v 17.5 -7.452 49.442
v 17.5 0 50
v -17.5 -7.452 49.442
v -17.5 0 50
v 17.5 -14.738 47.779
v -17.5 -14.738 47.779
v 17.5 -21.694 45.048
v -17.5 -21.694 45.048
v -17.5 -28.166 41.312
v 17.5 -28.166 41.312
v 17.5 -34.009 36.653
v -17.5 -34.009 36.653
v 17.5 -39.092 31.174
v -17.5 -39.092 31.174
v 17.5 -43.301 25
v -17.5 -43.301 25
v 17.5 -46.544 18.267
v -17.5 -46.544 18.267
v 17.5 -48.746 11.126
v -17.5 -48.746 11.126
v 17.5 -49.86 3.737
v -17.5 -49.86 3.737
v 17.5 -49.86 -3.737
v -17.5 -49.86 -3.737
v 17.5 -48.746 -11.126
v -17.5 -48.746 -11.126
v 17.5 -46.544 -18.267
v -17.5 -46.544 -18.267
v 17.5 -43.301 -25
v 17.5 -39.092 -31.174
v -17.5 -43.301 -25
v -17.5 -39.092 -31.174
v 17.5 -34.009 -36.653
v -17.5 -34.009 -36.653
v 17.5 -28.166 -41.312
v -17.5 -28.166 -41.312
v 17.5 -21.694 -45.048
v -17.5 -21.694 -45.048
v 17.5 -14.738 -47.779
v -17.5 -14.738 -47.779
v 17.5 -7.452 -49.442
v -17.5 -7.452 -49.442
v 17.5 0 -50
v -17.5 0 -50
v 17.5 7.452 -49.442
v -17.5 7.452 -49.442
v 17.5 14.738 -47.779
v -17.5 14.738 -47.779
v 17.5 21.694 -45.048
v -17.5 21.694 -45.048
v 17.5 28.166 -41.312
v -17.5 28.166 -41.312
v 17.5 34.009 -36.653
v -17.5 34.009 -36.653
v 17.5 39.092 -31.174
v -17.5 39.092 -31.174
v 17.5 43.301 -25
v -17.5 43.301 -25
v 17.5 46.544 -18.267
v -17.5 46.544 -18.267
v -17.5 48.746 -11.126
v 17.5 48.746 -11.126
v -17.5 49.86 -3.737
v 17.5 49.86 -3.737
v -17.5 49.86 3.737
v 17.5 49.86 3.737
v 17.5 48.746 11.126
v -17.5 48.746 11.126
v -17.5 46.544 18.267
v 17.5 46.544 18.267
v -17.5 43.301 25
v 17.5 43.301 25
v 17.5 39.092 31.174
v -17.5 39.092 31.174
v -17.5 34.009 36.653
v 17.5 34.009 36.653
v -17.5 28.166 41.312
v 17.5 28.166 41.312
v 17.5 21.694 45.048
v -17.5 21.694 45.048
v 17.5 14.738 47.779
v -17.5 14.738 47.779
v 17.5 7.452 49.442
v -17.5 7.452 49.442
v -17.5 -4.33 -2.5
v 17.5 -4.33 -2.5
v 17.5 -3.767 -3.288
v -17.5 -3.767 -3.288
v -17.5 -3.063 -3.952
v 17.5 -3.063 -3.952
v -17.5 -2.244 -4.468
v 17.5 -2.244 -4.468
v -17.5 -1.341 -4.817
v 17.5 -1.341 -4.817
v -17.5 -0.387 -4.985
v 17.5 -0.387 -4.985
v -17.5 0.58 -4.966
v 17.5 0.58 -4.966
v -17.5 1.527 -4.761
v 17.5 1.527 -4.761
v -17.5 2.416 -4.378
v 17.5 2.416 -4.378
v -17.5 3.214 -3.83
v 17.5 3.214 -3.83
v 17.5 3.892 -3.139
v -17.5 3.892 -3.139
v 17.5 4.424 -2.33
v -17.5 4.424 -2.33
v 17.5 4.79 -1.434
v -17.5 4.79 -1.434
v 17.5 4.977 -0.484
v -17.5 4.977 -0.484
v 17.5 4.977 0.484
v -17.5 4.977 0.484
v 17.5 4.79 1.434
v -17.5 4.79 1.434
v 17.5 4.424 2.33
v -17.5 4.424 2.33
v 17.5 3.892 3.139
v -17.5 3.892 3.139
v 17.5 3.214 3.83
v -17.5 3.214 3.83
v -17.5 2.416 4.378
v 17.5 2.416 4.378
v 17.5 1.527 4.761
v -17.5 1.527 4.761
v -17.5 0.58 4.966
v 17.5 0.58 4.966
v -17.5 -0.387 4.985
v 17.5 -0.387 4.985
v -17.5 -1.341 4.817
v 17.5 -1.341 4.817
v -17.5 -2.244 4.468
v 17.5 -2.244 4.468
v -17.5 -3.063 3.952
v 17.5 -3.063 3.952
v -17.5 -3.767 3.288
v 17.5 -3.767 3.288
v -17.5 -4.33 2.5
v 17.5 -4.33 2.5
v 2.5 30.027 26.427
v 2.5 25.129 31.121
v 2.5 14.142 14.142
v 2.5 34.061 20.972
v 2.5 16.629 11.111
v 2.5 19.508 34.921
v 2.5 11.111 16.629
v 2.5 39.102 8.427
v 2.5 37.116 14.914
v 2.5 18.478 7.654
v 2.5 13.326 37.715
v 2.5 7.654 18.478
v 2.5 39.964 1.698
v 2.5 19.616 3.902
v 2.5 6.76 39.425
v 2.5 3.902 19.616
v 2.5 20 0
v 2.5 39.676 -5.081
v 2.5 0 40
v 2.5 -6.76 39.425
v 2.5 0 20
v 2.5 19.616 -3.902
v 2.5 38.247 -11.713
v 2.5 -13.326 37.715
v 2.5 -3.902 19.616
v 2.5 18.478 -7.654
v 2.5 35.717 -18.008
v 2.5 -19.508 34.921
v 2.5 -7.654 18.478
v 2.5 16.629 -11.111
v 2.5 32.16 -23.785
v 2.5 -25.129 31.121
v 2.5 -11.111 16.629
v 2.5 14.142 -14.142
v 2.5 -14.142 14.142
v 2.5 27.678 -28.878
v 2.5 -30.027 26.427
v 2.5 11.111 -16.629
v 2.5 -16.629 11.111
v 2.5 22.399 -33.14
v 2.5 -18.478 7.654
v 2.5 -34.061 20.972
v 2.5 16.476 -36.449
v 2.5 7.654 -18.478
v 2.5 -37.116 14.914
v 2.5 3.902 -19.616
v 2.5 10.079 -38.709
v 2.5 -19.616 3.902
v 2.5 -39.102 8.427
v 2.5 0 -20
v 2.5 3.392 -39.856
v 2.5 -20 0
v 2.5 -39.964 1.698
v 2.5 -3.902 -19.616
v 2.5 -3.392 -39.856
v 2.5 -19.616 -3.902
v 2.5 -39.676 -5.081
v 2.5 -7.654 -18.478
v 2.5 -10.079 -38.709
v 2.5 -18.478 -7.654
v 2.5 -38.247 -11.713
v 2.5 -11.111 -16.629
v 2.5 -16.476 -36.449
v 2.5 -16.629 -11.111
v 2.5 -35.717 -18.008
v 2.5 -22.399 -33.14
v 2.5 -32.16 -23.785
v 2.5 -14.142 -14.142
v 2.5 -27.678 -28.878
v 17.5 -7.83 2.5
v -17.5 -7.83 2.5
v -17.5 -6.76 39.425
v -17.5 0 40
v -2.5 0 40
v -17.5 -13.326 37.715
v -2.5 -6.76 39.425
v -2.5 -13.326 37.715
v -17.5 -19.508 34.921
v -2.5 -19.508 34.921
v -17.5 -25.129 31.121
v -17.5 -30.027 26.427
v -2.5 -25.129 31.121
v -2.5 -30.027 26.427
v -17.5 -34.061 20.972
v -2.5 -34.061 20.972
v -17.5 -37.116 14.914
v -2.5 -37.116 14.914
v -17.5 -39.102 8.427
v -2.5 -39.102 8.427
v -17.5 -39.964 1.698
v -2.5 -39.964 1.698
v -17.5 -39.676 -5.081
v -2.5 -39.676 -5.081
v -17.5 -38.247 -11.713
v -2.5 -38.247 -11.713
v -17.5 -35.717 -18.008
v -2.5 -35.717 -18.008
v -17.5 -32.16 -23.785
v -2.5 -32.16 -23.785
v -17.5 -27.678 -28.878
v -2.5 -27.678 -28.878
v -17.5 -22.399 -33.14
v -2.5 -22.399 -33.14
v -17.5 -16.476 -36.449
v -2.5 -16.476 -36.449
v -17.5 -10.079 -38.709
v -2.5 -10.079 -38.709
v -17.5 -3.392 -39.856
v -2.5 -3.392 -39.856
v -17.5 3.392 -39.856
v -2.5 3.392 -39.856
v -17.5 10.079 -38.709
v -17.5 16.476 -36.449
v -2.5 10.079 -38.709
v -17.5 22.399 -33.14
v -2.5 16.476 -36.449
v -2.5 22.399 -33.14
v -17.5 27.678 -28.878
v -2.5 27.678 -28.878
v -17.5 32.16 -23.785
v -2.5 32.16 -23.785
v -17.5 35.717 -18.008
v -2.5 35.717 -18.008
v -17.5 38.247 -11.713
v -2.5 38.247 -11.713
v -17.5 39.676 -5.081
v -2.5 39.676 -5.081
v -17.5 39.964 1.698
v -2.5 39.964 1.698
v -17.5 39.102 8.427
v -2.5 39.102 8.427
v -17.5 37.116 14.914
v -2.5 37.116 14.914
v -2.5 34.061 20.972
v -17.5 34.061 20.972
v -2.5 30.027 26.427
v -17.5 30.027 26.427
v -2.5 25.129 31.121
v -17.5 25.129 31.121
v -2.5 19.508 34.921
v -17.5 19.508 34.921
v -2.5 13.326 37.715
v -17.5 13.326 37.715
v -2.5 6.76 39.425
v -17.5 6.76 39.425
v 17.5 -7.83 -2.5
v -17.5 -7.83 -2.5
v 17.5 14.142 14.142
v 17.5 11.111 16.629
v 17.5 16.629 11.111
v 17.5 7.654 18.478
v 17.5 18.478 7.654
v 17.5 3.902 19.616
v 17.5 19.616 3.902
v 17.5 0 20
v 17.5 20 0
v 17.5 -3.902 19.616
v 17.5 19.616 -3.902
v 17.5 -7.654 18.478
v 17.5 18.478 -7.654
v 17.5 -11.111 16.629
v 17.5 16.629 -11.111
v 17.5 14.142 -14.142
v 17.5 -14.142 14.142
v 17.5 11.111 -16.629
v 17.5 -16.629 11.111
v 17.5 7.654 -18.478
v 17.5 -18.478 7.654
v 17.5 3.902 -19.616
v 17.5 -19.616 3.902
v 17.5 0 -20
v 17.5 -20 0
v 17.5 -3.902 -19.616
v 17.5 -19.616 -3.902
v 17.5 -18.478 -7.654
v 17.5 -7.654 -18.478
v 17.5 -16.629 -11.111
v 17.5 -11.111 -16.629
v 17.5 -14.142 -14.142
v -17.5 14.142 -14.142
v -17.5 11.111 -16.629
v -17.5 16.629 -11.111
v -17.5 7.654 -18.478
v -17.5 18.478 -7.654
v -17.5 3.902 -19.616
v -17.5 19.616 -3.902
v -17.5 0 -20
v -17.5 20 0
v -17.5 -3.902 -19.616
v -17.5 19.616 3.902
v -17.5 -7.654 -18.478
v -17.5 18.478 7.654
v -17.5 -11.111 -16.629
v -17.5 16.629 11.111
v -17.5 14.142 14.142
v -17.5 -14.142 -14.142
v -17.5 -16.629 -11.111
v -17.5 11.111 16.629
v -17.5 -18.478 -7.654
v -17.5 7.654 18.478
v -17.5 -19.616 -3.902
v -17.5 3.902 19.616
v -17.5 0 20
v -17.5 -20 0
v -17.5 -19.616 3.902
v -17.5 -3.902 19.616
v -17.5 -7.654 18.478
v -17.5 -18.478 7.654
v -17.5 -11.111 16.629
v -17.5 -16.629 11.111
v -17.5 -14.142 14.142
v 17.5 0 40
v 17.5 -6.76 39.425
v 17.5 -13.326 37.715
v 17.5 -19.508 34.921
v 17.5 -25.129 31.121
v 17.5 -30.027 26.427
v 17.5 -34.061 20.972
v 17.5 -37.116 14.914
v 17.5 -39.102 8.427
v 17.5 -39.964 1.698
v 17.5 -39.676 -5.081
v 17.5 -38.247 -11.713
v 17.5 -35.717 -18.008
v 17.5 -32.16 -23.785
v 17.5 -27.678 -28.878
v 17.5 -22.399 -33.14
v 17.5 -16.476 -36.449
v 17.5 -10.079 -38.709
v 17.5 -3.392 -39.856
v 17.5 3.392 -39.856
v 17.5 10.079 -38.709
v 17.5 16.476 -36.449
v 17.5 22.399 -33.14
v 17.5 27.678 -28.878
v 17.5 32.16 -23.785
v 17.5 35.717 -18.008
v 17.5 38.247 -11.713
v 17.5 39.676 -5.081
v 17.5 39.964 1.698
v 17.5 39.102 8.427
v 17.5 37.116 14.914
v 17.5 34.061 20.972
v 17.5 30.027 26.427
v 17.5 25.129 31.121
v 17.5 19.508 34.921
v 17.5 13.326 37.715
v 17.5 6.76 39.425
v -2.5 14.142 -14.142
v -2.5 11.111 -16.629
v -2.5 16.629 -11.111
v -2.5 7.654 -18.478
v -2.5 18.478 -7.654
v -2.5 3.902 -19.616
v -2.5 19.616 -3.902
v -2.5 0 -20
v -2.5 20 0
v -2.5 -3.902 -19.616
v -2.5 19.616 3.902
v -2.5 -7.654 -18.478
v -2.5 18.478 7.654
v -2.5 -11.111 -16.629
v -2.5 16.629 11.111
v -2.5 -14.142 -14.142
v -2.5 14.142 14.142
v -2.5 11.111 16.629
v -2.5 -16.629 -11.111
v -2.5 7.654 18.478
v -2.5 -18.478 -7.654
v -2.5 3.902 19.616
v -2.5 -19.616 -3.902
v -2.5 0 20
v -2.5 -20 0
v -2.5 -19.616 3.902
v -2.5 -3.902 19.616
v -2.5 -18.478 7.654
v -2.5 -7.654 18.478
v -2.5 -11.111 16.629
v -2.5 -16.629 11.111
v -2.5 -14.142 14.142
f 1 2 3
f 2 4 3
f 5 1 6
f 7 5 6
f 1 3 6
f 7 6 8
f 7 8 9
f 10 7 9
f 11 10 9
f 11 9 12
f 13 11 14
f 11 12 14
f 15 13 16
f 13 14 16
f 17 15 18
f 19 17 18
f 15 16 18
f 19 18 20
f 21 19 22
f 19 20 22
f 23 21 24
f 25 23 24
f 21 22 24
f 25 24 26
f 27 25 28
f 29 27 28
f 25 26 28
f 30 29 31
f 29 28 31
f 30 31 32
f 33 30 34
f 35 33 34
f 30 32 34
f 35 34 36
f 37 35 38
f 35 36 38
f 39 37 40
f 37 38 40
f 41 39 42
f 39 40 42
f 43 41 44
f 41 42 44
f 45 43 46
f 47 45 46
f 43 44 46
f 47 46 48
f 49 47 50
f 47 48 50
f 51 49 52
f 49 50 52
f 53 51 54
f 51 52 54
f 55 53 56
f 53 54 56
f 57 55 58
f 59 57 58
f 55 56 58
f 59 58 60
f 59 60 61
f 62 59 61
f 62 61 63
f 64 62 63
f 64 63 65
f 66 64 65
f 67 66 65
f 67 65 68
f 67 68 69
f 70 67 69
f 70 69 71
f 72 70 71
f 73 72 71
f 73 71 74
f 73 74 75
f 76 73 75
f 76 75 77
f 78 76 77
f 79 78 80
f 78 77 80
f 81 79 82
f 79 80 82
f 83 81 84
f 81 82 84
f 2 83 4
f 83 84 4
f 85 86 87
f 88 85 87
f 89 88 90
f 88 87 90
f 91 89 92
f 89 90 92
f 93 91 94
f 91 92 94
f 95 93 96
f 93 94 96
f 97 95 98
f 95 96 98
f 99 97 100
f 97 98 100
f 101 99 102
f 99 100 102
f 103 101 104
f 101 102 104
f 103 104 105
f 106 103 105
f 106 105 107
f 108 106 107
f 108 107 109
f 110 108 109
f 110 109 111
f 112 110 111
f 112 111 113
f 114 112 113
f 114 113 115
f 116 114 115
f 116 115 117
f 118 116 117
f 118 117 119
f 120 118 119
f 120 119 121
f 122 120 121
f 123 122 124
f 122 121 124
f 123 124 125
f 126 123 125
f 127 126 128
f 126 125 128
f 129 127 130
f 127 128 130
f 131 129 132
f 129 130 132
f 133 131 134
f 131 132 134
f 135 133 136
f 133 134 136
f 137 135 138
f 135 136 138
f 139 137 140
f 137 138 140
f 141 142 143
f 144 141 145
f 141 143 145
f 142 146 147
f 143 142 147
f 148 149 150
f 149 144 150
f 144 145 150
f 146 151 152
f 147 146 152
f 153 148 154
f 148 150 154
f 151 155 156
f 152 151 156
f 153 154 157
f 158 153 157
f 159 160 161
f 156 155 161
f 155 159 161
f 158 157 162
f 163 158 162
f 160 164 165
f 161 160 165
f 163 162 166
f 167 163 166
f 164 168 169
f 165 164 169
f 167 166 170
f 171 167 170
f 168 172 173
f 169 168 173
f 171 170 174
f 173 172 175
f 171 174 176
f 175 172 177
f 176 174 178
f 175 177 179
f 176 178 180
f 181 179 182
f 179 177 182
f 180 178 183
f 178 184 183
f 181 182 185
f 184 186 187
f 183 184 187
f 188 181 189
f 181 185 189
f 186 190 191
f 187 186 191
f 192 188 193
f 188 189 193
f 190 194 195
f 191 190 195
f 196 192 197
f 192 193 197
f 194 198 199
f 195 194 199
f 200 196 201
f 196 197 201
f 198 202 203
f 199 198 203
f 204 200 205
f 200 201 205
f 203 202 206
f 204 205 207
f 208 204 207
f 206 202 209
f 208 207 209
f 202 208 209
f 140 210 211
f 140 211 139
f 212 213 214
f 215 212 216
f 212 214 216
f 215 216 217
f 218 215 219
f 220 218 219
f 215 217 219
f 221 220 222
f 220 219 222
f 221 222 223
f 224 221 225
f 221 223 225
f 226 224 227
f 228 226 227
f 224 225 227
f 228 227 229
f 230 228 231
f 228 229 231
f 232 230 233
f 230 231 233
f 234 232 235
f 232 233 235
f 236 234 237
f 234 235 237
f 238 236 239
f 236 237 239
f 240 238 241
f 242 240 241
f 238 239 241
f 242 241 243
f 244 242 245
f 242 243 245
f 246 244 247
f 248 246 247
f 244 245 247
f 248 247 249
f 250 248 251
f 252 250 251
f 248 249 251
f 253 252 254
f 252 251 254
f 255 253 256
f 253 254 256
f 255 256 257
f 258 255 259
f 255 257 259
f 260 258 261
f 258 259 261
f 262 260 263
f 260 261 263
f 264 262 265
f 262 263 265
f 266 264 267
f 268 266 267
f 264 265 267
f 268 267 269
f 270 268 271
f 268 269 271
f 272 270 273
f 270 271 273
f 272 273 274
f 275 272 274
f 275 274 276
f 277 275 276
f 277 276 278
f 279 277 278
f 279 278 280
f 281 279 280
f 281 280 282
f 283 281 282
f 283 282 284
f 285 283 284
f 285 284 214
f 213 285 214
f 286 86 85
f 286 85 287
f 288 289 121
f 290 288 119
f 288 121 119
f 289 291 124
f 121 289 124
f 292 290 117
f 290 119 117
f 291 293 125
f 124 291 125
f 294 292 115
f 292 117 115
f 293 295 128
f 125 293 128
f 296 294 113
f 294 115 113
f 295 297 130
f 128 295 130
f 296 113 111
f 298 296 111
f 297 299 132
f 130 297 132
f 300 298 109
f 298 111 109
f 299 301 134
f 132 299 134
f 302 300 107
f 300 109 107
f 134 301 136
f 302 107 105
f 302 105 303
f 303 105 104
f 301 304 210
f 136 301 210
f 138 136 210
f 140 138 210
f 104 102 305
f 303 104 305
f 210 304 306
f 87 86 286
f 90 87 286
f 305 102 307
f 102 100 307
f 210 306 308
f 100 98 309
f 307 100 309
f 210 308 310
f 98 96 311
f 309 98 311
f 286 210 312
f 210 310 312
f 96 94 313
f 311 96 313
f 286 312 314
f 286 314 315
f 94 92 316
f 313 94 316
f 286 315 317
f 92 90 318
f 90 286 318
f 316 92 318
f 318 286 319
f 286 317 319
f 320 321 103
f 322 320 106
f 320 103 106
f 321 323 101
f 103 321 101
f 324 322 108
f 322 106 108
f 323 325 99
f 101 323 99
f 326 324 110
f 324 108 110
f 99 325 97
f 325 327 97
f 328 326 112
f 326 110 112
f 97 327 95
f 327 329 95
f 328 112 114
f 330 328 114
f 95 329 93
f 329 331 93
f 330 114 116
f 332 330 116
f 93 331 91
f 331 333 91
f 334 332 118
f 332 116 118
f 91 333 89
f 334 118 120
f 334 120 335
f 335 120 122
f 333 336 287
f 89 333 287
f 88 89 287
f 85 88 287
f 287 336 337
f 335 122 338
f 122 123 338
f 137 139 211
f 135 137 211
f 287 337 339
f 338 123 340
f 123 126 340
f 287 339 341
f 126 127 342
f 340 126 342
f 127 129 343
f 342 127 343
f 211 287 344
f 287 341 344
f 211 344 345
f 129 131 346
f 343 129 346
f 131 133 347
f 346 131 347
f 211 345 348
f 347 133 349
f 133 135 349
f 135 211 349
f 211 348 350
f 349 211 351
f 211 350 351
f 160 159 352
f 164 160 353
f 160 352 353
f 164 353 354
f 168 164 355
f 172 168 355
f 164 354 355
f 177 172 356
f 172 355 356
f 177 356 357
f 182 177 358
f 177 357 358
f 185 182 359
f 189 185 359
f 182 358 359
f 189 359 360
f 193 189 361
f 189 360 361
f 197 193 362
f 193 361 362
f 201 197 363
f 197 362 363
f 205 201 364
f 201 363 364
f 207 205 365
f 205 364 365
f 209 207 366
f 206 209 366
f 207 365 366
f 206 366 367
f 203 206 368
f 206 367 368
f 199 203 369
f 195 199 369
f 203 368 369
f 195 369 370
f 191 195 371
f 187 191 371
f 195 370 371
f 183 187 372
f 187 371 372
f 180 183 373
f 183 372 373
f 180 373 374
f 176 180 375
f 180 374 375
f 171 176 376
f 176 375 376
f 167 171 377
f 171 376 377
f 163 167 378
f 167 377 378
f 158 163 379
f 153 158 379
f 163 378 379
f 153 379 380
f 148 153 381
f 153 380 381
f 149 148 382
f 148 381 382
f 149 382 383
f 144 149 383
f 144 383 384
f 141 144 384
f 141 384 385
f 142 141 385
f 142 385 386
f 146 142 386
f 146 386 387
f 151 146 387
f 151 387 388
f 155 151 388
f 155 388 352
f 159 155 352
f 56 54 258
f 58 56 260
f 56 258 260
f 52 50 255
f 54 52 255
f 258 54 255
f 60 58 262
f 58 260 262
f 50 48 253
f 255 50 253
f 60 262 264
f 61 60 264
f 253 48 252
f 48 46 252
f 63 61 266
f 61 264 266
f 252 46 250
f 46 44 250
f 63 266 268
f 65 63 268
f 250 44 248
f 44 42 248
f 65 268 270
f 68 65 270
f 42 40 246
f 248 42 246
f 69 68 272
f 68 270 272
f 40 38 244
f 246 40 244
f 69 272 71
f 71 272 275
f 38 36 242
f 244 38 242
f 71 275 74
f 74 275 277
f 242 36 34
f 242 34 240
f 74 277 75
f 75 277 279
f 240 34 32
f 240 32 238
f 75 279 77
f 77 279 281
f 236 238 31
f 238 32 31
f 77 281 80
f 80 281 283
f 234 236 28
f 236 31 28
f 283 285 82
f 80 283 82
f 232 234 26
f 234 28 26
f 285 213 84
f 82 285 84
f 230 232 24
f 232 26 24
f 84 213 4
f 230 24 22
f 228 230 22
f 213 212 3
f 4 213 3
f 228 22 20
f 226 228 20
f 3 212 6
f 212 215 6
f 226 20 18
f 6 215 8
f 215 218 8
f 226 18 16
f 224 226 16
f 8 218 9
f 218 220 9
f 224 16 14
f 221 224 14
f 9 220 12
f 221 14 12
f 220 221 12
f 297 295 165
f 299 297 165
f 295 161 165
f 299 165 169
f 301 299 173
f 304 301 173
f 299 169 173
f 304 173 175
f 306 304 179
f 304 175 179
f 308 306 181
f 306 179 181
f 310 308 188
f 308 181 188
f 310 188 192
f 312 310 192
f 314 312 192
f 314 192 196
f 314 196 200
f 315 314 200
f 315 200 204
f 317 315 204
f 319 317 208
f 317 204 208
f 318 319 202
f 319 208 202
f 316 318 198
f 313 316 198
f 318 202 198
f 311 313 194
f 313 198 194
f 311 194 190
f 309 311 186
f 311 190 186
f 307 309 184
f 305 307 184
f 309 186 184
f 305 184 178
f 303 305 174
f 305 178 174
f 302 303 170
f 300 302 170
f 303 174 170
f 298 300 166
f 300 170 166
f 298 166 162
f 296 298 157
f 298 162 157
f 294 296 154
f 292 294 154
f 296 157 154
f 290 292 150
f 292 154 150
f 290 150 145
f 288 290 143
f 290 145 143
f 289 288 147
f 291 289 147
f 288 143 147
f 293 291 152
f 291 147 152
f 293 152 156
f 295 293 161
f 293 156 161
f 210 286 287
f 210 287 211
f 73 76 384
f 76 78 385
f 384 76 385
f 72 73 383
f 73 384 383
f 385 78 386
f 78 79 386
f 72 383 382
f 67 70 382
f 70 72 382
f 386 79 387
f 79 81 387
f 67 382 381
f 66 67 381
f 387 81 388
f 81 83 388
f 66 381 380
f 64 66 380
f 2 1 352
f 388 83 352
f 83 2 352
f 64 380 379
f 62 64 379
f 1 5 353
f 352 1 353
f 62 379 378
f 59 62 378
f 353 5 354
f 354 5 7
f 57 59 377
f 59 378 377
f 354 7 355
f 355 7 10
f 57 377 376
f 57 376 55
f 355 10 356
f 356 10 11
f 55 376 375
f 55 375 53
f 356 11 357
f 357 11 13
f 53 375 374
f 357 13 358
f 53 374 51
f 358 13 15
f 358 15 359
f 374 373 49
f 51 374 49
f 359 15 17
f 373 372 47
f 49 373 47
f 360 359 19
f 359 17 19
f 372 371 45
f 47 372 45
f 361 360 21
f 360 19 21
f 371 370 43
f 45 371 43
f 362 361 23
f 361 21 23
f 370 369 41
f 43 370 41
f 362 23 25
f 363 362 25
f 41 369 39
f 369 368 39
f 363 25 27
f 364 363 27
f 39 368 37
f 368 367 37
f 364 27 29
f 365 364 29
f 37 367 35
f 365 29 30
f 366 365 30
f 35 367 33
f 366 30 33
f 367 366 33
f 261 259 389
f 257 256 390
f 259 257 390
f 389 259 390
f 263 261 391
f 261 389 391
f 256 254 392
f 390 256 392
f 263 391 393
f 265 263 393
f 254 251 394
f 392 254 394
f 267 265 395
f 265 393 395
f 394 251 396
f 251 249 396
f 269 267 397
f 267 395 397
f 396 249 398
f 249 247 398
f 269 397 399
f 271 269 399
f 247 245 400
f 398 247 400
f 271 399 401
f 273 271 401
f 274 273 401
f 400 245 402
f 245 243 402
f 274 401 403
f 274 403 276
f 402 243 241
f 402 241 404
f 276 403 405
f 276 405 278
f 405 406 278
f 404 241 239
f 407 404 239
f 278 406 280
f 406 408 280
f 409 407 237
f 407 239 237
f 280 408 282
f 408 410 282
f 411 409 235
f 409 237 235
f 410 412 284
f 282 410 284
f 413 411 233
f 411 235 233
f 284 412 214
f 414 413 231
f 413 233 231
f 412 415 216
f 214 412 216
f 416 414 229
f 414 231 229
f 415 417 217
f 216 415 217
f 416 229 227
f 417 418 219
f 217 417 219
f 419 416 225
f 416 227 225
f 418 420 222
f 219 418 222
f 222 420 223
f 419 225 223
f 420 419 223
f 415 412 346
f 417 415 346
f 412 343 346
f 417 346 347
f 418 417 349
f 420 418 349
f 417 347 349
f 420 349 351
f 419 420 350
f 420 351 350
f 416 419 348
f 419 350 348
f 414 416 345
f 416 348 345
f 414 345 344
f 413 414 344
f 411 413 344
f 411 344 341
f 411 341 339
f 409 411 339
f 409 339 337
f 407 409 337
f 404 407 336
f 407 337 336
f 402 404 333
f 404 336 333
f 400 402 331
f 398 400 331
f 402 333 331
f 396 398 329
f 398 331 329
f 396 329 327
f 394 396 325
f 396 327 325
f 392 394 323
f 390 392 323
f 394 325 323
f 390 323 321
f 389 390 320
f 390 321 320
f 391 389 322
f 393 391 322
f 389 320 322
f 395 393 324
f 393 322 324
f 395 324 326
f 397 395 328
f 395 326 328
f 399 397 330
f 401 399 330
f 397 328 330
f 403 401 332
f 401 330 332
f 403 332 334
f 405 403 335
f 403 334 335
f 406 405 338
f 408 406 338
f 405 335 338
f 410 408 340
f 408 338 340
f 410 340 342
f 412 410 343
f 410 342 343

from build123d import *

# Parameters (mm, degrees)
CUT_EXTRUDE1_DEPTH = 79.89866919


with BuildPart() as part:
    # Sketch1 → Revolve1 (revolve)
    with BuildSketch(Plane.XY, mode=Mode.PRIVATE) as revolve1_sk:
        Polygon((-17.5, 5), (17.5, 5), (17.5, 20), (2.5, 20), (2.5, 40), (17.5, 40), (17.5, 50), (-17.5, 50), (-17.5, 40), (-2.5, 40), (-2.5, 20), (-17.5, 20), align=None)
    revolve(revolve1_sk.sketch.rotate(Axis((-17.5, 0, 0), (1, 0, 0)), 90), axis=Axis((-17.5, 0, 0), (1, 0, 0)))

    # Sketch2 → Cut-Extrude1 (cut, through all)
    with BuildSketch(Plane(origin=(17.5, 0, 0), x_dir=(0, 0, -1), z_dir=(1, 0, 0))):
        with BuildLine():
            Line((2.5, -4.330127019), (2.5, -7.830127019))
            Line((2.5, -7.830127019), (-2.5, -7.830127019))
            Line((-2.5, -7.830127019), (-2.5, -4.330127019))
            ThreePointArc((-2.5, -4.330127019), (0, -5), (2.5, -4.330127019))
        make_face()
    extrude(amount=-CUT_EXTRUDE1_DEPTH, mode=Mode.SUBTRACT)


solid = part.part
